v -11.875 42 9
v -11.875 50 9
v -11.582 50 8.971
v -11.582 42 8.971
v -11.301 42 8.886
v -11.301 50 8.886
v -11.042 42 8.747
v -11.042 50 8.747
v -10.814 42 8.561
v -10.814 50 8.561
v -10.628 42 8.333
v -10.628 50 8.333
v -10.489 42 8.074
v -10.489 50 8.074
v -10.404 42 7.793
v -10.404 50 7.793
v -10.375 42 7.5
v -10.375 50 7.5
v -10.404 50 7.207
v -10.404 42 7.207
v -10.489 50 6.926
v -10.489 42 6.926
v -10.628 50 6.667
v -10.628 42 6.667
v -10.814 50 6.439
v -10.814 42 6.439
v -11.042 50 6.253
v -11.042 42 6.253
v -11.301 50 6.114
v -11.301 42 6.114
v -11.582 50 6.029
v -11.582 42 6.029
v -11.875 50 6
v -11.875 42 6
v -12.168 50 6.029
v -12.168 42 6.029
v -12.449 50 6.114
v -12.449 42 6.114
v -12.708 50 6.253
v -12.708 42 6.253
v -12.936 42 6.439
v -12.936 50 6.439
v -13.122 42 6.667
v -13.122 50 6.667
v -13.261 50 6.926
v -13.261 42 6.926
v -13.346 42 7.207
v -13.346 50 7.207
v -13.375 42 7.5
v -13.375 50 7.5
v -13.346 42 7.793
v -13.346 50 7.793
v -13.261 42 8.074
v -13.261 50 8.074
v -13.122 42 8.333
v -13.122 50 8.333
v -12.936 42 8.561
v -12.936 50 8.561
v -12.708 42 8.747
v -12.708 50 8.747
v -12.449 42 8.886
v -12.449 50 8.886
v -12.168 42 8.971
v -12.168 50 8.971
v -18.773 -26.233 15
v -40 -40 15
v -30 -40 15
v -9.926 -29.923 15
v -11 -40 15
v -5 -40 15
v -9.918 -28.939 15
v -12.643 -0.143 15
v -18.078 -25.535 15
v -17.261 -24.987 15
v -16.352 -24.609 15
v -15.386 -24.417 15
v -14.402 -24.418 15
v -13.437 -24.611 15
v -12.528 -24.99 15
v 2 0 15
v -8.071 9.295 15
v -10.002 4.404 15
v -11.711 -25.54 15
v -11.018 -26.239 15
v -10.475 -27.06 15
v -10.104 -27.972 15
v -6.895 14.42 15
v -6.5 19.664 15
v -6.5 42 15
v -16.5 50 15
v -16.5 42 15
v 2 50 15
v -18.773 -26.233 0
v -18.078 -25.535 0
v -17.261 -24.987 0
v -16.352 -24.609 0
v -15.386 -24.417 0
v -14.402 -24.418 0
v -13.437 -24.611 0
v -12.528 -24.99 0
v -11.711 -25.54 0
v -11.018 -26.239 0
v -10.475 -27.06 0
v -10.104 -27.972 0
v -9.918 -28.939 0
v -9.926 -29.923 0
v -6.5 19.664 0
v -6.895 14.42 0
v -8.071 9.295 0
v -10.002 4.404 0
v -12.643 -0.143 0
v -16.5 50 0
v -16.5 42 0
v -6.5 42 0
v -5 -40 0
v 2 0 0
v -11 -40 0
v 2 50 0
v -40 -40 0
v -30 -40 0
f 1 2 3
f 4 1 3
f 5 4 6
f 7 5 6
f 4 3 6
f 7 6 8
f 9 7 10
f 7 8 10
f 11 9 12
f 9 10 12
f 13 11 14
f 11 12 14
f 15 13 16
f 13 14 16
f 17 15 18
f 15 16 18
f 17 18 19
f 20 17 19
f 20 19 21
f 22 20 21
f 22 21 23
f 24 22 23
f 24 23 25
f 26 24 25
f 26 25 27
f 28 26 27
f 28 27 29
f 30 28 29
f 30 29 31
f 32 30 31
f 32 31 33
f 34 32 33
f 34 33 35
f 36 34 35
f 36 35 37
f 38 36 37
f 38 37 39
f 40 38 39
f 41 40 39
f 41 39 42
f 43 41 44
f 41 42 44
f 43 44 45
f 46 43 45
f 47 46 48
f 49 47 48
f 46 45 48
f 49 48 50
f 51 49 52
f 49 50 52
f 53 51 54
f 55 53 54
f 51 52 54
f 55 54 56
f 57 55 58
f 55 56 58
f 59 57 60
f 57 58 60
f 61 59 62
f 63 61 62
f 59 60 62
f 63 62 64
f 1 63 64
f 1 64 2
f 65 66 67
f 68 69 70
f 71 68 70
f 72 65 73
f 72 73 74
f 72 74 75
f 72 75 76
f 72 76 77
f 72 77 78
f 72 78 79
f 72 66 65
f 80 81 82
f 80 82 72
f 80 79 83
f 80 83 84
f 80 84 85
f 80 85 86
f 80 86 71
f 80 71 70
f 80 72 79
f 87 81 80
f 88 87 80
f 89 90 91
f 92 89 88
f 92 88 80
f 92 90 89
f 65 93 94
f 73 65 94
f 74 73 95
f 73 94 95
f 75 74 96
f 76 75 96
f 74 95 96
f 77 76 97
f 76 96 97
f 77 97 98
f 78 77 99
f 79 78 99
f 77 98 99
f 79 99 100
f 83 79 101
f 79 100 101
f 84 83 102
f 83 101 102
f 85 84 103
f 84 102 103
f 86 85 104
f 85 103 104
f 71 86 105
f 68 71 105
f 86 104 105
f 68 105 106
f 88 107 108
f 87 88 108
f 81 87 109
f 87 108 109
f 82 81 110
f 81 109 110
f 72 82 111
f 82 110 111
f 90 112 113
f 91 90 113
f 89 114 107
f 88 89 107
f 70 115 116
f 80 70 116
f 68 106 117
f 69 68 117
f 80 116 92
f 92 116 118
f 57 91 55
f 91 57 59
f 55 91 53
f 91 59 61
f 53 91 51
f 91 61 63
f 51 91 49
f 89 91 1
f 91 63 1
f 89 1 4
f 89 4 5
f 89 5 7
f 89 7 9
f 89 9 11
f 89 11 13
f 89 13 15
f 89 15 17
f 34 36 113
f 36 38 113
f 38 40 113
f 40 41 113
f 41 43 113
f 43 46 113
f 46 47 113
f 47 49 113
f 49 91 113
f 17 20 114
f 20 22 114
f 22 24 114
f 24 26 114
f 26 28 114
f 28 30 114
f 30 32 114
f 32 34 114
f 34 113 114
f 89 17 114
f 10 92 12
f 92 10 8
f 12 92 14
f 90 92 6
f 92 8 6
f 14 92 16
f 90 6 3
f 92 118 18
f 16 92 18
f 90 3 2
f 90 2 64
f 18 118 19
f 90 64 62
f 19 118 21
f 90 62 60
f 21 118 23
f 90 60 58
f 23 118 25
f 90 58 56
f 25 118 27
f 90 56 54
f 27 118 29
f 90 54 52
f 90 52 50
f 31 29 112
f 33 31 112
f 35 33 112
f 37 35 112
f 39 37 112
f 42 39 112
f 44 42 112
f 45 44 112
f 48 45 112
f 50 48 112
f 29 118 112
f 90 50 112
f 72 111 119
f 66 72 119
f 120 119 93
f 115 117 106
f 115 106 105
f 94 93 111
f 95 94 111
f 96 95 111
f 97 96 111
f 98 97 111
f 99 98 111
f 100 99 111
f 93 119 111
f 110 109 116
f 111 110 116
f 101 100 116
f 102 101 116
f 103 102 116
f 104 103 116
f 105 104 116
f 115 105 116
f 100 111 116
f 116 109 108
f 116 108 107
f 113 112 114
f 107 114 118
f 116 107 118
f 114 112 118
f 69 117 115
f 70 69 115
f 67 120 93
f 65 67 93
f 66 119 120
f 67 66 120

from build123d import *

# Parameters (mm, degrees)
BOSS_EXTRUDE1_DEPTH = 15
SKETCH2_R           = 1.5
CUT_EXTRUDE1_DEPTH  = 15


with BuildPart() as part:
    # Sketch1 → Boss-Extrude1 (new body)
    with BuildSketch(Plane.XY):
        with BuildLine():
            Line((-11, 42), (-6.5, 42))
            Line((-6.5, 42), (-6.5, 19.663584609))
            ThreePointArc((-6.5, 19.663584609), (-8.071080696, 9.29500929), (-12.643277381, -0.1427164))
            Line((-12.643277381, -0.1427164), (-40, -40))
            Line((-40, -40), (-30, -40))
            Line((-30, -40), (-18.772519607, -26.233092947))
            ThreePointArc((-18.772519607, -26.233092947), (-12.972906424, -24.778489823), (-9.925888036, -29.923104703))
            Line((-9.925888036, -29.923104703), (-11, -40))
            Line((-11, -40), (-5, -40))
            Line((-5, -40), (2, 0))
            Line((2, 0), (2, 30))
            Line((2, 30), (2, 50))
            Line((2, 50), (-11, 50))
            Line((-11, 50), (-16.5, 50))
            Line((-16.5, 50), (-16.5, 42))
            Line((-16.5, 42), (-11, 42))
        make_face()
    extrude(amount=BOSS_EXTRUDE1_DEPTH)

    # Sketch2 → Cut-Extrude1 (cut)
    with BuildSketch(Plane(origin=(0, 50, 0), x_dir=(1, 0, 0), z_dir=(0, 1, 0))):
        with Locations(Location((-11.875, -7.5, 0), (0, 0, 270))):
            Circle(SKETCH2_R)
    extrude(amount=-CUT_EXTRUDE1_DEPTH, mode=Mode.SUBTRACT)


solid = part.part
